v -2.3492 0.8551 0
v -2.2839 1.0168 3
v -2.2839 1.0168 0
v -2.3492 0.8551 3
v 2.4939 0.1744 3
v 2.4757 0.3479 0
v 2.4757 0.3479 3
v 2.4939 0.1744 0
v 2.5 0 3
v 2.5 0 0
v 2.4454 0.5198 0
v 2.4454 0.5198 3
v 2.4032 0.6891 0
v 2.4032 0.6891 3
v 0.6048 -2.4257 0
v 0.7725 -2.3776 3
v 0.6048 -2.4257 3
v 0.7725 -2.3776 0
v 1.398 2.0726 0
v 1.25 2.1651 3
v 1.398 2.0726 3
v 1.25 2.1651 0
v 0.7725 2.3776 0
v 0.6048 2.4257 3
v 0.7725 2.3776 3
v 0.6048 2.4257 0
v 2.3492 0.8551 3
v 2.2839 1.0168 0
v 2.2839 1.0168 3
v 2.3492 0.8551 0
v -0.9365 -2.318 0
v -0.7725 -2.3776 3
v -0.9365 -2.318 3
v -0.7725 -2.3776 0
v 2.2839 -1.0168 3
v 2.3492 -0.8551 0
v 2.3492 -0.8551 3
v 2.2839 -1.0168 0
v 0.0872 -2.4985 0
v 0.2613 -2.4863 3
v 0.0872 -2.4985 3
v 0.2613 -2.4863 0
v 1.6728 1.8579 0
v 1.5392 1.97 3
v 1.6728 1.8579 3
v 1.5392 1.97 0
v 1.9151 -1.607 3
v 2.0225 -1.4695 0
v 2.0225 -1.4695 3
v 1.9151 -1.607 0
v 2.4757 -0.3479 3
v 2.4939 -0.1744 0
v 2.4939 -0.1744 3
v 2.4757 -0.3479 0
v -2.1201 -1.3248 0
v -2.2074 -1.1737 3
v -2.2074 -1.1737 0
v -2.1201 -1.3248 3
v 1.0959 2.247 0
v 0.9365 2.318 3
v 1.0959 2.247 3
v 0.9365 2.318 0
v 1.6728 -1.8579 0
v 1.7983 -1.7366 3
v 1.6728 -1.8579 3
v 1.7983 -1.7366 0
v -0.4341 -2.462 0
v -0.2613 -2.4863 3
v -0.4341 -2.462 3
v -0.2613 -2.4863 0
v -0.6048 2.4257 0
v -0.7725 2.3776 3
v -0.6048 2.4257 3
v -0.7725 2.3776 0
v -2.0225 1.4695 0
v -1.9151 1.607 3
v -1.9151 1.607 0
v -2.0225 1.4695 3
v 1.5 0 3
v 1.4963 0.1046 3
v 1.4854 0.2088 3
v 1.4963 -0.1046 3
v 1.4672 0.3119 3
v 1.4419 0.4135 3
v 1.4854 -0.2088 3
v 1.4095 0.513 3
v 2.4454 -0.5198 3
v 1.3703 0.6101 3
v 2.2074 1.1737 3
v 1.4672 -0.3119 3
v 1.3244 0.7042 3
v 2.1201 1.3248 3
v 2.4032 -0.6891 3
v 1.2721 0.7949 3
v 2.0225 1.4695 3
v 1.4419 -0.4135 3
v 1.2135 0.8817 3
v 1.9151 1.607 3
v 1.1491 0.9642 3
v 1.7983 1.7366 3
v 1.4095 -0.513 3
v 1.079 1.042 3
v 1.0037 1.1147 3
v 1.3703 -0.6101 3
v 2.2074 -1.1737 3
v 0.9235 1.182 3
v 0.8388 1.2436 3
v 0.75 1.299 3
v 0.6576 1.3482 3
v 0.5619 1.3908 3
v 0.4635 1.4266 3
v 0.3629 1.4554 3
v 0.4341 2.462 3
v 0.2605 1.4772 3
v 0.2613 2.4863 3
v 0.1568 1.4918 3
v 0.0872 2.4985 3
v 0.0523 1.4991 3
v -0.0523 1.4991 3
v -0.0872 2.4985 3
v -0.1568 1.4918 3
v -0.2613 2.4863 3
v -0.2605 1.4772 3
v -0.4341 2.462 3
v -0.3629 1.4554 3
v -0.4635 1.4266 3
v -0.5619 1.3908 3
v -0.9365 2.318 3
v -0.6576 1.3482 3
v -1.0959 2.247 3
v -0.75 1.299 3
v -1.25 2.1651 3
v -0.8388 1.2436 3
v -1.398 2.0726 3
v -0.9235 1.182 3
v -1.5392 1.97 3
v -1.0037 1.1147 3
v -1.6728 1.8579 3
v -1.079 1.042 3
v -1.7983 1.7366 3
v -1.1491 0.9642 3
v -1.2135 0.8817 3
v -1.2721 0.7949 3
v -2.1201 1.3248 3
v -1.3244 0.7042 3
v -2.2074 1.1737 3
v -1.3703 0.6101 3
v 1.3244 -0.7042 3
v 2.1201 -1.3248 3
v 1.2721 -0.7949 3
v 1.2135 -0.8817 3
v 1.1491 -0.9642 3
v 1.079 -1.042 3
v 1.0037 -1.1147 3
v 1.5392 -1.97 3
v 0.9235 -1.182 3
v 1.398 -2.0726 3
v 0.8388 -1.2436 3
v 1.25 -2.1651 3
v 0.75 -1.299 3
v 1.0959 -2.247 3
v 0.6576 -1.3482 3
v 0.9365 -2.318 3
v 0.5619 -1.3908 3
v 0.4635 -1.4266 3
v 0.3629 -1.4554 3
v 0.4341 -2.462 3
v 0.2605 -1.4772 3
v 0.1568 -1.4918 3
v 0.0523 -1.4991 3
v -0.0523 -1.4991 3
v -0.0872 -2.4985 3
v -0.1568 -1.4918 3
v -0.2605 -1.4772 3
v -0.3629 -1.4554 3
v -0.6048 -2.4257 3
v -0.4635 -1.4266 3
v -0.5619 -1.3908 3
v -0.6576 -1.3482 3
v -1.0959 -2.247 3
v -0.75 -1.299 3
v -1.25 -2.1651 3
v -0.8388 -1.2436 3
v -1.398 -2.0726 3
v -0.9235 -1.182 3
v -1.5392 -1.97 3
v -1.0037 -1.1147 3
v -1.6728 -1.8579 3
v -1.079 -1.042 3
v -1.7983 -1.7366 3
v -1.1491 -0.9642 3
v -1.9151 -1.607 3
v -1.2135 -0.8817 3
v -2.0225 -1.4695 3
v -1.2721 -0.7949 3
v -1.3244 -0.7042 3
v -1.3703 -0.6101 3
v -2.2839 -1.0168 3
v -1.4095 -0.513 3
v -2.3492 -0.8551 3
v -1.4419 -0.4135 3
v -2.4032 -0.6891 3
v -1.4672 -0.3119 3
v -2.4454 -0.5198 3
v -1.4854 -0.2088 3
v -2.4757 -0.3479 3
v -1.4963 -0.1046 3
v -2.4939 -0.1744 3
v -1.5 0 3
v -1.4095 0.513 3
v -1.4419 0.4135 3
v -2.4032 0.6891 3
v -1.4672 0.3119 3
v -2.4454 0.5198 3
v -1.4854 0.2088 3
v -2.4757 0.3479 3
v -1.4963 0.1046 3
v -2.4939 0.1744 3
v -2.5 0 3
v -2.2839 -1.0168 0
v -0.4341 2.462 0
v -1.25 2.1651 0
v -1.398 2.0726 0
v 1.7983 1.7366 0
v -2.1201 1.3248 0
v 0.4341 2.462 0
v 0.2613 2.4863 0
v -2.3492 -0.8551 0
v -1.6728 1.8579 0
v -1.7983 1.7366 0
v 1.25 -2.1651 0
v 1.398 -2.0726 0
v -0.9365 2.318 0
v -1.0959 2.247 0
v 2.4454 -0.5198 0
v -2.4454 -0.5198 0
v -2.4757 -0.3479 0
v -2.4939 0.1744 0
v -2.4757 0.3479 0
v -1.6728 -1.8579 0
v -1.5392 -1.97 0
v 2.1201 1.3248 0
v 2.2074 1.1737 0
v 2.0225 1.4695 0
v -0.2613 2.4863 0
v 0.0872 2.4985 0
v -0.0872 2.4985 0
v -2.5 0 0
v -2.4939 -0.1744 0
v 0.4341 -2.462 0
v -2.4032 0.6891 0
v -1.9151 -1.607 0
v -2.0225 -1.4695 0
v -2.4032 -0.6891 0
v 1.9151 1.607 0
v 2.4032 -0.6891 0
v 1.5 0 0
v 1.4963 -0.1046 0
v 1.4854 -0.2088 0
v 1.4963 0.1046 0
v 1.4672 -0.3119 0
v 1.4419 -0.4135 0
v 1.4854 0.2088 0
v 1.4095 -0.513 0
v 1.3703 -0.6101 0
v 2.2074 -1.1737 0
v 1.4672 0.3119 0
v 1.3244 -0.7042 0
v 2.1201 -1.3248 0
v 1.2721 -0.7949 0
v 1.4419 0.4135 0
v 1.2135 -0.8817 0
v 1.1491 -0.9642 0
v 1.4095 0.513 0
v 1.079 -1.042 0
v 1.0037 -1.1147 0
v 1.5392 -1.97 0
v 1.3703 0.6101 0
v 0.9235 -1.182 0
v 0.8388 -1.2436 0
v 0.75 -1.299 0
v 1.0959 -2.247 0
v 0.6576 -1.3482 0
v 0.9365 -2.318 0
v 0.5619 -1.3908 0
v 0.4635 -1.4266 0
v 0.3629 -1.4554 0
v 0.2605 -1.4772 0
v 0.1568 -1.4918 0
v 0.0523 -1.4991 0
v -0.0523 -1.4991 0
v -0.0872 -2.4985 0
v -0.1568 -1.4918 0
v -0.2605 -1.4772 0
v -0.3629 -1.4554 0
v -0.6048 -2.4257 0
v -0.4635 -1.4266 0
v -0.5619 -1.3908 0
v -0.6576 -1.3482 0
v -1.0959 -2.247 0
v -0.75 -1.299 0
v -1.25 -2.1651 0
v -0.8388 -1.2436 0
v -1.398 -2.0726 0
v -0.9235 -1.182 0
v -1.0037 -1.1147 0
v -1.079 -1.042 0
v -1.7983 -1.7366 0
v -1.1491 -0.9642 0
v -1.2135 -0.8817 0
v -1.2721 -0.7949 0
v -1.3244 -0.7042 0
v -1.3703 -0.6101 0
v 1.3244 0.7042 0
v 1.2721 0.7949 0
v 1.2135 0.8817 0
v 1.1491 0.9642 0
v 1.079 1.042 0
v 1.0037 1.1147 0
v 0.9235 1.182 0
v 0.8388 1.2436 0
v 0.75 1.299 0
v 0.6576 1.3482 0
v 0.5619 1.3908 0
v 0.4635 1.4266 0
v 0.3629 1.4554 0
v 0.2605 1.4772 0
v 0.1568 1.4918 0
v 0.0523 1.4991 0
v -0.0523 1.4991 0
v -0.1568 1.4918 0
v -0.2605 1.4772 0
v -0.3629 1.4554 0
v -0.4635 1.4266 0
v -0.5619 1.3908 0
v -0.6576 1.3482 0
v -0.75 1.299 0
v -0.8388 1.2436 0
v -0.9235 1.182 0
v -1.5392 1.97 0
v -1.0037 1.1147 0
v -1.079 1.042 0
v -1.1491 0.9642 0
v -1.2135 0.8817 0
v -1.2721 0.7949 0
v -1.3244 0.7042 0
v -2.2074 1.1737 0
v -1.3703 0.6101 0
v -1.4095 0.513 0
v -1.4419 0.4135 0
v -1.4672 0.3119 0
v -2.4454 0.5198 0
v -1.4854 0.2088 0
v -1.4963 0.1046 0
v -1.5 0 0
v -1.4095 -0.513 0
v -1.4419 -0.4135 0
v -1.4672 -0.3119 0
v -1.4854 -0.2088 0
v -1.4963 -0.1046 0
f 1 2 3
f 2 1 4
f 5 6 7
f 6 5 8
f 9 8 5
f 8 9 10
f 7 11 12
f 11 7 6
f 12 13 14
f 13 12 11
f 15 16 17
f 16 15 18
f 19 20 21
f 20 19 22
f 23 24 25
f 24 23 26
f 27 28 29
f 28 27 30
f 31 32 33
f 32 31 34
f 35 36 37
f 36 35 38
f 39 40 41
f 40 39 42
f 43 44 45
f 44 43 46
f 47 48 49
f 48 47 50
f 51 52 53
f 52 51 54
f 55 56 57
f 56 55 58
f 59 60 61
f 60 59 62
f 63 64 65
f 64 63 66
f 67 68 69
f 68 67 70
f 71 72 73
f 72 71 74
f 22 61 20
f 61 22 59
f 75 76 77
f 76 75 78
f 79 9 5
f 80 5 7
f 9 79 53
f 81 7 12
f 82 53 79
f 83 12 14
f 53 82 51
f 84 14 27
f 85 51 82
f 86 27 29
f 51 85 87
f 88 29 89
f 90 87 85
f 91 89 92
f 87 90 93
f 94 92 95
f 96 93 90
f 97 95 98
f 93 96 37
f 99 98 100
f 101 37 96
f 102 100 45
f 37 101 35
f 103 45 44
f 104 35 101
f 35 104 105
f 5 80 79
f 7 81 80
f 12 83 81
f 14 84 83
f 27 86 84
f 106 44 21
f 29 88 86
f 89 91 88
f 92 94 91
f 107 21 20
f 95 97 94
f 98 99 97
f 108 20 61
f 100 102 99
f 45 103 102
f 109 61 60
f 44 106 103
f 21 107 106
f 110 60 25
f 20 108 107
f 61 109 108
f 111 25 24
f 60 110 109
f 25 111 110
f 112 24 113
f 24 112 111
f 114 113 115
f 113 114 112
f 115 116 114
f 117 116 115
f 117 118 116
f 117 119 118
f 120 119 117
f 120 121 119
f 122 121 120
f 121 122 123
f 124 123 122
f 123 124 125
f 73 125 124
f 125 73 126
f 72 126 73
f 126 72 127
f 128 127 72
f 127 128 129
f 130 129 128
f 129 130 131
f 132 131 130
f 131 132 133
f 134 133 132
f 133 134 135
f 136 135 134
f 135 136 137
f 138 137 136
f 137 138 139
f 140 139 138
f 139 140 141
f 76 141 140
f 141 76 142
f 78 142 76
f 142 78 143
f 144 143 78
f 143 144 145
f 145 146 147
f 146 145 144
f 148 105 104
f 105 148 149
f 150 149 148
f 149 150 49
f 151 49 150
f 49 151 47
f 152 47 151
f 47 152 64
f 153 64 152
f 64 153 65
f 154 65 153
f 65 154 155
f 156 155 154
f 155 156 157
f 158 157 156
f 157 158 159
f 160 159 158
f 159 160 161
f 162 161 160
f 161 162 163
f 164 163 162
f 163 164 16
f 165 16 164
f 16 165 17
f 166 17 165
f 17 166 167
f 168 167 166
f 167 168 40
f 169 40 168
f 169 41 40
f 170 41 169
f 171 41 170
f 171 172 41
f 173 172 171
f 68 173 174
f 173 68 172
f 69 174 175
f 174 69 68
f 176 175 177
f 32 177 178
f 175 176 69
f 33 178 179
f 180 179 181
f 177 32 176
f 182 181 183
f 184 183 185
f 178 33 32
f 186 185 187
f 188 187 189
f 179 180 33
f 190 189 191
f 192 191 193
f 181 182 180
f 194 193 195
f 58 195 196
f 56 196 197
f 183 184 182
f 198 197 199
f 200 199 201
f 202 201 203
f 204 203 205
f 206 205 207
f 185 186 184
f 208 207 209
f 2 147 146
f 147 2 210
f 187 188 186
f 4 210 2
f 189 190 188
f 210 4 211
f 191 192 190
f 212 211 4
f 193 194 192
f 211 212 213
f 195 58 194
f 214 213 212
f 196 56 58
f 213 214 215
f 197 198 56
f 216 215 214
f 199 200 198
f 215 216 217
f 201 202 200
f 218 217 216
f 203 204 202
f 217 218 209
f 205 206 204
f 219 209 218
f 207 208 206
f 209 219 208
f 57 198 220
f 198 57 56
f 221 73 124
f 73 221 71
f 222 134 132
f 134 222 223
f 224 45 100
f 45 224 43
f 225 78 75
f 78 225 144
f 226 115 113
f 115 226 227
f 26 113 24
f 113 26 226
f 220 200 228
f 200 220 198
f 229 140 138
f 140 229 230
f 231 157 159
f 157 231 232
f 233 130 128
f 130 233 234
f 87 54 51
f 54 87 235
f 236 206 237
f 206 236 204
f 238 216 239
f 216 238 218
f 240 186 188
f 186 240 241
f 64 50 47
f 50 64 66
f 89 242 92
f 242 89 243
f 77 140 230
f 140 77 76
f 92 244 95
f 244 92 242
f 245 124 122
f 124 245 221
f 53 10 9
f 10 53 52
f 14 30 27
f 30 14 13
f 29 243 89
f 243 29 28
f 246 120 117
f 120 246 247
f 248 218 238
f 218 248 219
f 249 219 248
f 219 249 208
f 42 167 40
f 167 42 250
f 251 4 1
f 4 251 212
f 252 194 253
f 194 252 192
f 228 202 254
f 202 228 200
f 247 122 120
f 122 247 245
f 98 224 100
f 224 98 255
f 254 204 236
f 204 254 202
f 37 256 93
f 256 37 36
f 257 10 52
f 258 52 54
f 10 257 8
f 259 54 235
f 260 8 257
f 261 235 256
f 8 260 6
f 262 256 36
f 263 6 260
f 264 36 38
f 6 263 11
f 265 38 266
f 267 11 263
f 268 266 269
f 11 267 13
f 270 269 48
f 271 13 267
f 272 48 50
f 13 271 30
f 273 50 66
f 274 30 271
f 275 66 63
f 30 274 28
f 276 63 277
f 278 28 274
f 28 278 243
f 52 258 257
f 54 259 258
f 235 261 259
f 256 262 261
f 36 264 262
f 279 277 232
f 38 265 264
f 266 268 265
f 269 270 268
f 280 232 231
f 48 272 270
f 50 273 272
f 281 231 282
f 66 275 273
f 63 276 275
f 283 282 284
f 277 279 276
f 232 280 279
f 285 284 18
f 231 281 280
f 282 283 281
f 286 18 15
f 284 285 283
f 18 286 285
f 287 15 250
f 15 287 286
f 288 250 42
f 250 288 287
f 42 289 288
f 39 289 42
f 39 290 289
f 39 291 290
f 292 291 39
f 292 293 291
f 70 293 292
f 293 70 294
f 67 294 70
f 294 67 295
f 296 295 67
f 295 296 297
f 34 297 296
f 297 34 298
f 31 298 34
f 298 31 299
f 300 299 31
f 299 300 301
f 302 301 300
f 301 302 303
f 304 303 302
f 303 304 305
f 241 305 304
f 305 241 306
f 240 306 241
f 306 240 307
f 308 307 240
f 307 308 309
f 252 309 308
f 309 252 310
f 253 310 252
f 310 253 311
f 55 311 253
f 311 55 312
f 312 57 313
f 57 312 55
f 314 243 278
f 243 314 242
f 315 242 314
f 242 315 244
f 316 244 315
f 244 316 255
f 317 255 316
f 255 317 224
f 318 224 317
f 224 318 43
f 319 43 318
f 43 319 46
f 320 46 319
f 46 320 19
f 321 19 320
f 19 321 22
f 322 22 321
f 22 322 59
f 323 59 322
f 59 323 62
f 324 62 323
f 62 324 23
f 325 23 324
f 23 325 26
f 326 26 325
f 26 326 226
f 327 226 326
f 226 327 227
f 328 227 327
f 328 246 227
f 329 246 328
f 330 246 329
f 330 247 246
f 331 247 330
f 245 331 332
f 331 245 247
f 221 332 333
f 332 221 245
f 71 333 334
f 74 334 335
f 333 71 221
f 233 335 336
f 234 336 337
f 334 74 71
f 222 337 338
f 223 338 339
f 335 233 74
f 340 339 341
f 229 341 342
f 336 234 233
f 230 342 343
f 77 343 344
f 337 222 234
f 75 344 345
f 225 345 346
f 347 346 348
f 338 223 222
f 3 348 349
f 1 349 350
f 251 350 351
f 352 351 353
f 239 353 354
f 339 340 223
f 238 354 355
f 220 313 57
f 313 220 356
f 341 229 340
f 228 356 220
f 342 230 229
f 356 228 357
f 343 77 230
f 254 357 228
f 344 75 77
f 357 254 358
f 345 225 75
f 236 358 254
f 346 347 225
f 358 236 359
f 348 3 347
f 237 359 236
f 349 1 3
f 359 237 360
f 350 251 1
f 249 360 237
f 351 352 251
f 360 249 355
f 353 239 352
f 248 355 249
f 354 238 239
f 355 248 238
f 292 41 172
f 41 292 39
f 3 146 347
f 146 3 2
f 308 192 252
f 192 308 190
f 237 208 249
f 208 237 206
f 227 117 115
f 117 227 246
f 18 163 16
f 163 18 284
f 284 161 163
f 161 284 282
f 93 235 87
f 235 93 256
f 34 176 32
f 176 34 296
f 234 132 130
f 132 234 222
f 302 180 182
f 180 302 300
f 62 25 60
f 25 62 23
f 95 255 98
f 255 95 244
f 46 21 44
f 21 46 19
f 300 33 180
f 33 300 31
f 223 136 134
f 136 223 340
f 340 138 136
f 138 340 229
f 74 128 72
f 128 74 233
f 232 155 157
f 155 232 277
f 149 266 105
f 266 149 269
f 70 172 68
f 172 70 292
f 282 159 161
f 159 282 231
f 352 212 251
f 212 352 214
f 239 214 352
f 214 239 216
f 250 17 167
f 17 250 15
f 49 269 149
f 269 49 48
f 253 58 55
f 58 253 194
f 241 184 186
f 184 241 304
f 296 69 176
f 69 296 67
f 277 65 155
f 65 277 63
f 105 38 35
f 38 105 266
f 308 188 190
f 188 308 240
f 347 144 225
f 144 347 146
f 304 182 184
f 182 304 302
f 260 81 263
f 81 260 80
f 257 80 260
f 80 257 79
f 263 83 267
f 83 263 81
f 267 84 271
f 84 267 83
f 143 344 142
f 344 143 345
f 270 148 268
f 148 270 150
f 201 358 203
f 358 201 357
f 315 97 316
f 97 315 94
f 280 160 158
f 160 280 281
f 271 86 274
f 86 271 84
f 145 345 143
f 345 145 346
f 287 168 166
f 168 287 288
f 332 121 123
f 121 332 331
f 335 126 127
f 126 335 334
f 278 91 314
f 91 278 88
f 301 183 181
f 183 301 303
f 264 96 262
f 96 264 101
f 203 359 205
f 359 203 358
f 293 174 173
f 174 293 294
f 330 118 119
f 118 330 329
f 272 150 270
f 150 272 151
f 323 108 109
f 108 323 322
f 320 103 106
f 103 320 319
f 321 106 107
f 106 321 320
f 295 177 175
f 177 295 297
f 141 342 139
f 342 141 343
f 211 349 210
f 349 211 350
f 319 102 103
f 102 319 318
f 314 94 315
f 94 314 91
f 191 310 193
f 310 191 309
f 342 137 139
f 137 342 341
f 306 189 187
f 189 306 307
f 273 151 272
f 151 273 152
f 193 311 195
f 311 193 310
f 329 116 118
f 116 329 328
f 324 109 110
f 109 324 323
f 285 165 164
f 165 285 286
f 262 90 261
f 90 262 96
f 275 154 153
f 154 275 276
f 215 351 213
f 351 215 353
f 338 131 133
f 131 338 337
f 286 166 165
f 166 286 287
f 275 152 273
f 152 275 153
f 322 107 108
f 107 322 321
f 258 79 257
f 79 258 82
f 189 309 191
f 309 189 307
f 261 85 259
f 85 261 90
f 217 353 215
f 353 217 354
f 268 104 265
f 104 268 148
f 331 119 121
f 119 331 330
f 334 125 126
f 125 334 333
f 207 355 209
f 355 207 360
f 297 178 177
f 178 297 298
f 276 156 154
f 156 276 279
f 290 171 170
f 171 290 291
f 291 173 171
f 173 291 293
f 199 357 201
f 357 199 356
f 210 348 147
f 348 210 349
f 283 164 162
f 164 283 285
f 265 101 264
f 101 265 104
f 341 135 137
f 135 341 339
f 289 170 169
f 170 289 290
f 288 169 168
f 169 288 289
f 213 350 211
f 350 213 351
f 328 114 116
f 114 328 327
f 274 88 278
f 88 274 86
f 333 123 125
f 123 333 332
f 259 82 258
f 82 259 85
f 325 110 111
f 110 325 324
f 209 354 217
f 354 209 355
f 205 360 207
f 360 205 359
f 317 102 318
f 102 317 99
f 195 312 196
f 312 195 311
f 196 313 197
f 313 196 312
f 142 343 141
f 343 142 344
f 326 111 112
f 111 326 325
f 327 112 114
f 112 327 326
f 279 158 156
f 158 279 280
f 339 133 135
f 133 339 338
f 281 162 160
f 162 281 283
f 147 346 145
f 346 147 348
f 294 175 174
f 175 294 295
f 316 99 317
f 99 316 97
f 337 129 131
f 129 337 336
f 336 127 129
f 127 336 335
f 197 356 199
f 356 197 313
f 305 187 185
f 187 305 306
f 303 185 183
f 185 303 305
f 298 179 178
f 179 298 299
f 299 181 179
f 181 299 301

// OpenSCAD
s_d=3;
p_d=5;
p_h=3;

$fn=90;

difference() {
    cylinder(p_h, d=p_d);
    cylinder(p_h, d=s_d);
}
